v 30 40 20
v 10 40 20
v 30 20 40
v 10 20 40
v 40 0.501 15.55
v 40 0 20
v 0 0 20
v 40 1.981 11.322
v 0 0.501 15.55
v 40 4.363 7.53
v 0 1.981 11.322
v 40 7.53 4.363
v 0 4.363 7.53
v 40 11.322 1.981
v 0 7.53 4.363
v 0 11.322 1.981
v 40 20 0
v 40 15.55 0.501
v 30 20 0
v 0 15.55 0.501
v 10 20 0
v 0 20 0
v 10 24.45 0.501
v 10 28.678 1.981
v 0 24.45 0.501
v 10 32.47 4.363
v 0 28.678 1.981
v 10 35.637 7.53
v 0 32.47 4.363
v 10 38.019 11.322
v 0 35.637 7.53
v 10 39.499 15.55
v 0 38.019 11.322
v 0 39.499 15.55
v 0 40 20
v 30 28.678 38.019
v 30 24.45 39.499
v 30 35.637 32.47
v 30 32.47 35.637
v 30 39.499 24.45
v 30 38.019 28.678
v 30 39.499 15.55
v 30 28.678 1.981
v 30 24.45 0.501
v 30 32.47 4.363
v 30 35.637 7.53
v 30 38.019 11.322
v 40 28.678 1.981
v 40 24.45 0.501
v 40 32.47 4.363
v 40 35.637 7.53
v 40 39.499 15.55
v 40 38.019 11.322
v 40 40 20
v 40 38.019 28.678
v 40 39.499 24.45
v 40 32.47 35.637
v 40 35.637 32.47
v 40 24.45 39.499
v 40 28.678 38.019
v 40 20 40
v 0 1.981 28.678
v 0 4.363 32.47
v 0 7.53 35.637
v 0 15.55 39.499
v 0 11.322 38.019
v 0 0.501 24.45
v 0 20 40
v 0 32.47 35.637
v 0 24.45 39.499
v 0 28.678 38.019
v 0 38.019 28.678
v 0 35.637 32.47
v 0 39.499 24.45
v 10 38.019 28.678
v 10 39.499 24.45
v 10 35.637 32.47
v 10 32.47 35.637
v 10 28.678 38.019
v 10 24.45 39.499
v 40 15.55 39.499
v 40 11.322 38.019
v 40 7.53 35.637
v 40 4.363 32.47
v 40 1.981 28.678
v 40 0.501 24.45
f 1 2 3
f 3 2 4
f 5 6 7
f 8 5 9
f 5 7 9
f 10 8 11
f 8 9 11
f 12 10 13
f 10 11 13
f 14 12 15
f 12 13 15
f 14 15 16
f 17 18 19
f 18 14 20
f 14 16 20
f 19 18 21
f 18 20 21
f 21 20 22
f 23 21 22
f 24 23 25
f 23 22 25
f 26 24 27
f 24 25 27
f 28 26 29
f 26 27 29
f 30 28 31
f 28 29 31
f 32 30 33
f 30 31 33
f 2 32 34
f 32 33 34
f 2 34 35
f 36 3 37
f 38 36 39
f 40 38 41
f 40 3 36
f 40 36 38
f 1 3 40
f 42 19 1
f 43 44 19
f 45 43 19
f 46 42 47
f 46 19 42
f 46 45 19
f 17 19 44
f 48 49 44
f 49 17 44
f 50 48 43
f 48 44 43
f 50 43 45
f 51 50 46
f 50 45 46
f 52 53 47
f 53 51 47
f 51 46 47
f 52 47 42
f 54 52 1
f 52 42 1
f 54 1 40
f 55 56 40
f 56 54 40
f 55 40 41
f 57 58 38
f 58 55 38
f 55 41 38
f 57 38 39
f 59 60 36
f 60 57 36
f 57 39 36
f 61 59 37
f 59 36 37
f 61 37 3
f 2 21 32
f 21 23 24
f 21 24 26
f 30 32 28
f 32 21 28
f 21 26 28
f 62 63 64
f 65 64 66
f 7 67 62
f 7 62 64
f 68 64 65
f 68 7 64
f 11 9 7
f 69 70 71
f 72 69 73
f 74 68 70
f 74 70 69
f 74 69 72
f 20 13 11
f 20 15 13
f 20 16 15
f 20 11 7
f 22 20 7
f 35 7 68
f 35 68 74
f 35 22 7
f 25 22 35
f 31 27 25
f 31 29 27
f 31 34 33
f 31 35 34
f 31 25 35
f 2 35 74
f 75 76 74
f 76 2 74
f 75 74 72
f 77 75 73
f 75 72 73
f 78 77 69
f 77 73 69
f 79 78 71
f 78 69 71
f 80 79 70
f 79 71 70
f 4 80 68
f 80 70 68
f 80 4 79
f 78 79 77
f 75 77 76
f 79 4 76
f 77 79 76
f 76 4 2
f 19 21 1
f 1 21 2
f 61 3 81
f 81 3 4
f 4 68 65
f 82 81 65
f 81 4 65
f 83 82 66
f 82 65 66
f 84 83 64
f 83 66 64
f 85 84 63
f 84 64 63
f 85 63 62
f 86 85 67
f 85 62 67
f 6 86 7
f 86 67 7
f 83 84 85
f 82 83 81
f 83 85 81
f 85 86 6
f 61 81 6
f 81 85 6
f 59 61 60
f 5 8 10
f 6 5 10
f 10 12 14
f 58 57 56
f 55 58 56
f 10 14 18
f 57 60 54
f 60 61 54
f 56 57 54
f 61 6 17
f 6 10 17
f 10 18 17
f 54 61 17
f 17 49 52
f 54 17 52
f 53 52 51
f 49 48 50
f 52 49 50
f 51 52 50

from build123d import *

# Parameters (mm, degrees)
SKETCH1_W           = 40
SKETCH1_H           = 40
BOSS_EXTRUDE1_DEPTH = 40
CUT_EXTRUDE1_DEPTH  = 71
SKETCH3_W           = 20
SKETCH3_H           = 20
CUT_EXTRUDE2_DEPTH  = 71
BOSS_EXTRUDE2_DEPTH = 20


with BuildPart() as part:
    # Sketch1 → Boss-Extrude1 (new body)
    with BuildSketch(Plane.XY):
        with Locations((20, 20)):
            Rectangle(SKETCH1_W, SKETCH1_H)
    extrude(amount=BOSS_EXTRUDE1_DEPTH)

    # Sketch2 → Cut-Extrude1 (cut)
    with BuildSketch(Plane.ZY):
        with BuildLine():
            Line((20, 40), (0, 40))
            Line((0, 40), (0, 20))
            ThreePointArc((0, 20), (5.857864376, 34.142135624), (20, 40))
        make_face()
        with BuildLine():
            Line((40, 40), (20, 40))
            ThreePointArc((20, 40), (34.142135624, 34.142135624), (40, 20))
            Line((40, 20), (40, 40))
        make_face()
        with BuildLine():
            Line((40, 0), (40, 20))
            ThreePointArc((40, 20), (34.142135624, 5.857864376), (20, 0))
            Line((20, 0), (40, 0))
        make_face()
        with BuildLine():
            ThreePointArc((20, 0), (5.857864376, 5.857864376), (0, 20))
            Line((0, 20), (0, 0))
            Line((0, 0), (20, 0))
        make_face()
    extrude(amount=-CUT_EXTRUDE1_DEPTH, mode=Mode.SUBTRACT)

    # Sketch3 → Cut-Extrude2 (cut)
    with BuildSketch(Plane.XY):
        with Locations((20, 30)):
            Rectangle(SKETCH3_W, SKETCH3_H)
    extrude(amount=CUT_EXTRUDE2_DEPTH, mode=Mode.SUBTRACT)

    # Sketch4 → Boss-Extrude2 (add)
    with BuildSketch(Plane(origin=(10, 0, 0), x_dir=(0, 0, -1), z_dir=(1, 0, 0))):
        Polygon((-40, 20), (-20, 20), (-20, 40), align=None)
        Polygon((-20, 40), (-20, 20), (0, 20), align=None)
    extrude(amount=BOSS_EXTRUDE2_DEPTH)


solid = part.part
